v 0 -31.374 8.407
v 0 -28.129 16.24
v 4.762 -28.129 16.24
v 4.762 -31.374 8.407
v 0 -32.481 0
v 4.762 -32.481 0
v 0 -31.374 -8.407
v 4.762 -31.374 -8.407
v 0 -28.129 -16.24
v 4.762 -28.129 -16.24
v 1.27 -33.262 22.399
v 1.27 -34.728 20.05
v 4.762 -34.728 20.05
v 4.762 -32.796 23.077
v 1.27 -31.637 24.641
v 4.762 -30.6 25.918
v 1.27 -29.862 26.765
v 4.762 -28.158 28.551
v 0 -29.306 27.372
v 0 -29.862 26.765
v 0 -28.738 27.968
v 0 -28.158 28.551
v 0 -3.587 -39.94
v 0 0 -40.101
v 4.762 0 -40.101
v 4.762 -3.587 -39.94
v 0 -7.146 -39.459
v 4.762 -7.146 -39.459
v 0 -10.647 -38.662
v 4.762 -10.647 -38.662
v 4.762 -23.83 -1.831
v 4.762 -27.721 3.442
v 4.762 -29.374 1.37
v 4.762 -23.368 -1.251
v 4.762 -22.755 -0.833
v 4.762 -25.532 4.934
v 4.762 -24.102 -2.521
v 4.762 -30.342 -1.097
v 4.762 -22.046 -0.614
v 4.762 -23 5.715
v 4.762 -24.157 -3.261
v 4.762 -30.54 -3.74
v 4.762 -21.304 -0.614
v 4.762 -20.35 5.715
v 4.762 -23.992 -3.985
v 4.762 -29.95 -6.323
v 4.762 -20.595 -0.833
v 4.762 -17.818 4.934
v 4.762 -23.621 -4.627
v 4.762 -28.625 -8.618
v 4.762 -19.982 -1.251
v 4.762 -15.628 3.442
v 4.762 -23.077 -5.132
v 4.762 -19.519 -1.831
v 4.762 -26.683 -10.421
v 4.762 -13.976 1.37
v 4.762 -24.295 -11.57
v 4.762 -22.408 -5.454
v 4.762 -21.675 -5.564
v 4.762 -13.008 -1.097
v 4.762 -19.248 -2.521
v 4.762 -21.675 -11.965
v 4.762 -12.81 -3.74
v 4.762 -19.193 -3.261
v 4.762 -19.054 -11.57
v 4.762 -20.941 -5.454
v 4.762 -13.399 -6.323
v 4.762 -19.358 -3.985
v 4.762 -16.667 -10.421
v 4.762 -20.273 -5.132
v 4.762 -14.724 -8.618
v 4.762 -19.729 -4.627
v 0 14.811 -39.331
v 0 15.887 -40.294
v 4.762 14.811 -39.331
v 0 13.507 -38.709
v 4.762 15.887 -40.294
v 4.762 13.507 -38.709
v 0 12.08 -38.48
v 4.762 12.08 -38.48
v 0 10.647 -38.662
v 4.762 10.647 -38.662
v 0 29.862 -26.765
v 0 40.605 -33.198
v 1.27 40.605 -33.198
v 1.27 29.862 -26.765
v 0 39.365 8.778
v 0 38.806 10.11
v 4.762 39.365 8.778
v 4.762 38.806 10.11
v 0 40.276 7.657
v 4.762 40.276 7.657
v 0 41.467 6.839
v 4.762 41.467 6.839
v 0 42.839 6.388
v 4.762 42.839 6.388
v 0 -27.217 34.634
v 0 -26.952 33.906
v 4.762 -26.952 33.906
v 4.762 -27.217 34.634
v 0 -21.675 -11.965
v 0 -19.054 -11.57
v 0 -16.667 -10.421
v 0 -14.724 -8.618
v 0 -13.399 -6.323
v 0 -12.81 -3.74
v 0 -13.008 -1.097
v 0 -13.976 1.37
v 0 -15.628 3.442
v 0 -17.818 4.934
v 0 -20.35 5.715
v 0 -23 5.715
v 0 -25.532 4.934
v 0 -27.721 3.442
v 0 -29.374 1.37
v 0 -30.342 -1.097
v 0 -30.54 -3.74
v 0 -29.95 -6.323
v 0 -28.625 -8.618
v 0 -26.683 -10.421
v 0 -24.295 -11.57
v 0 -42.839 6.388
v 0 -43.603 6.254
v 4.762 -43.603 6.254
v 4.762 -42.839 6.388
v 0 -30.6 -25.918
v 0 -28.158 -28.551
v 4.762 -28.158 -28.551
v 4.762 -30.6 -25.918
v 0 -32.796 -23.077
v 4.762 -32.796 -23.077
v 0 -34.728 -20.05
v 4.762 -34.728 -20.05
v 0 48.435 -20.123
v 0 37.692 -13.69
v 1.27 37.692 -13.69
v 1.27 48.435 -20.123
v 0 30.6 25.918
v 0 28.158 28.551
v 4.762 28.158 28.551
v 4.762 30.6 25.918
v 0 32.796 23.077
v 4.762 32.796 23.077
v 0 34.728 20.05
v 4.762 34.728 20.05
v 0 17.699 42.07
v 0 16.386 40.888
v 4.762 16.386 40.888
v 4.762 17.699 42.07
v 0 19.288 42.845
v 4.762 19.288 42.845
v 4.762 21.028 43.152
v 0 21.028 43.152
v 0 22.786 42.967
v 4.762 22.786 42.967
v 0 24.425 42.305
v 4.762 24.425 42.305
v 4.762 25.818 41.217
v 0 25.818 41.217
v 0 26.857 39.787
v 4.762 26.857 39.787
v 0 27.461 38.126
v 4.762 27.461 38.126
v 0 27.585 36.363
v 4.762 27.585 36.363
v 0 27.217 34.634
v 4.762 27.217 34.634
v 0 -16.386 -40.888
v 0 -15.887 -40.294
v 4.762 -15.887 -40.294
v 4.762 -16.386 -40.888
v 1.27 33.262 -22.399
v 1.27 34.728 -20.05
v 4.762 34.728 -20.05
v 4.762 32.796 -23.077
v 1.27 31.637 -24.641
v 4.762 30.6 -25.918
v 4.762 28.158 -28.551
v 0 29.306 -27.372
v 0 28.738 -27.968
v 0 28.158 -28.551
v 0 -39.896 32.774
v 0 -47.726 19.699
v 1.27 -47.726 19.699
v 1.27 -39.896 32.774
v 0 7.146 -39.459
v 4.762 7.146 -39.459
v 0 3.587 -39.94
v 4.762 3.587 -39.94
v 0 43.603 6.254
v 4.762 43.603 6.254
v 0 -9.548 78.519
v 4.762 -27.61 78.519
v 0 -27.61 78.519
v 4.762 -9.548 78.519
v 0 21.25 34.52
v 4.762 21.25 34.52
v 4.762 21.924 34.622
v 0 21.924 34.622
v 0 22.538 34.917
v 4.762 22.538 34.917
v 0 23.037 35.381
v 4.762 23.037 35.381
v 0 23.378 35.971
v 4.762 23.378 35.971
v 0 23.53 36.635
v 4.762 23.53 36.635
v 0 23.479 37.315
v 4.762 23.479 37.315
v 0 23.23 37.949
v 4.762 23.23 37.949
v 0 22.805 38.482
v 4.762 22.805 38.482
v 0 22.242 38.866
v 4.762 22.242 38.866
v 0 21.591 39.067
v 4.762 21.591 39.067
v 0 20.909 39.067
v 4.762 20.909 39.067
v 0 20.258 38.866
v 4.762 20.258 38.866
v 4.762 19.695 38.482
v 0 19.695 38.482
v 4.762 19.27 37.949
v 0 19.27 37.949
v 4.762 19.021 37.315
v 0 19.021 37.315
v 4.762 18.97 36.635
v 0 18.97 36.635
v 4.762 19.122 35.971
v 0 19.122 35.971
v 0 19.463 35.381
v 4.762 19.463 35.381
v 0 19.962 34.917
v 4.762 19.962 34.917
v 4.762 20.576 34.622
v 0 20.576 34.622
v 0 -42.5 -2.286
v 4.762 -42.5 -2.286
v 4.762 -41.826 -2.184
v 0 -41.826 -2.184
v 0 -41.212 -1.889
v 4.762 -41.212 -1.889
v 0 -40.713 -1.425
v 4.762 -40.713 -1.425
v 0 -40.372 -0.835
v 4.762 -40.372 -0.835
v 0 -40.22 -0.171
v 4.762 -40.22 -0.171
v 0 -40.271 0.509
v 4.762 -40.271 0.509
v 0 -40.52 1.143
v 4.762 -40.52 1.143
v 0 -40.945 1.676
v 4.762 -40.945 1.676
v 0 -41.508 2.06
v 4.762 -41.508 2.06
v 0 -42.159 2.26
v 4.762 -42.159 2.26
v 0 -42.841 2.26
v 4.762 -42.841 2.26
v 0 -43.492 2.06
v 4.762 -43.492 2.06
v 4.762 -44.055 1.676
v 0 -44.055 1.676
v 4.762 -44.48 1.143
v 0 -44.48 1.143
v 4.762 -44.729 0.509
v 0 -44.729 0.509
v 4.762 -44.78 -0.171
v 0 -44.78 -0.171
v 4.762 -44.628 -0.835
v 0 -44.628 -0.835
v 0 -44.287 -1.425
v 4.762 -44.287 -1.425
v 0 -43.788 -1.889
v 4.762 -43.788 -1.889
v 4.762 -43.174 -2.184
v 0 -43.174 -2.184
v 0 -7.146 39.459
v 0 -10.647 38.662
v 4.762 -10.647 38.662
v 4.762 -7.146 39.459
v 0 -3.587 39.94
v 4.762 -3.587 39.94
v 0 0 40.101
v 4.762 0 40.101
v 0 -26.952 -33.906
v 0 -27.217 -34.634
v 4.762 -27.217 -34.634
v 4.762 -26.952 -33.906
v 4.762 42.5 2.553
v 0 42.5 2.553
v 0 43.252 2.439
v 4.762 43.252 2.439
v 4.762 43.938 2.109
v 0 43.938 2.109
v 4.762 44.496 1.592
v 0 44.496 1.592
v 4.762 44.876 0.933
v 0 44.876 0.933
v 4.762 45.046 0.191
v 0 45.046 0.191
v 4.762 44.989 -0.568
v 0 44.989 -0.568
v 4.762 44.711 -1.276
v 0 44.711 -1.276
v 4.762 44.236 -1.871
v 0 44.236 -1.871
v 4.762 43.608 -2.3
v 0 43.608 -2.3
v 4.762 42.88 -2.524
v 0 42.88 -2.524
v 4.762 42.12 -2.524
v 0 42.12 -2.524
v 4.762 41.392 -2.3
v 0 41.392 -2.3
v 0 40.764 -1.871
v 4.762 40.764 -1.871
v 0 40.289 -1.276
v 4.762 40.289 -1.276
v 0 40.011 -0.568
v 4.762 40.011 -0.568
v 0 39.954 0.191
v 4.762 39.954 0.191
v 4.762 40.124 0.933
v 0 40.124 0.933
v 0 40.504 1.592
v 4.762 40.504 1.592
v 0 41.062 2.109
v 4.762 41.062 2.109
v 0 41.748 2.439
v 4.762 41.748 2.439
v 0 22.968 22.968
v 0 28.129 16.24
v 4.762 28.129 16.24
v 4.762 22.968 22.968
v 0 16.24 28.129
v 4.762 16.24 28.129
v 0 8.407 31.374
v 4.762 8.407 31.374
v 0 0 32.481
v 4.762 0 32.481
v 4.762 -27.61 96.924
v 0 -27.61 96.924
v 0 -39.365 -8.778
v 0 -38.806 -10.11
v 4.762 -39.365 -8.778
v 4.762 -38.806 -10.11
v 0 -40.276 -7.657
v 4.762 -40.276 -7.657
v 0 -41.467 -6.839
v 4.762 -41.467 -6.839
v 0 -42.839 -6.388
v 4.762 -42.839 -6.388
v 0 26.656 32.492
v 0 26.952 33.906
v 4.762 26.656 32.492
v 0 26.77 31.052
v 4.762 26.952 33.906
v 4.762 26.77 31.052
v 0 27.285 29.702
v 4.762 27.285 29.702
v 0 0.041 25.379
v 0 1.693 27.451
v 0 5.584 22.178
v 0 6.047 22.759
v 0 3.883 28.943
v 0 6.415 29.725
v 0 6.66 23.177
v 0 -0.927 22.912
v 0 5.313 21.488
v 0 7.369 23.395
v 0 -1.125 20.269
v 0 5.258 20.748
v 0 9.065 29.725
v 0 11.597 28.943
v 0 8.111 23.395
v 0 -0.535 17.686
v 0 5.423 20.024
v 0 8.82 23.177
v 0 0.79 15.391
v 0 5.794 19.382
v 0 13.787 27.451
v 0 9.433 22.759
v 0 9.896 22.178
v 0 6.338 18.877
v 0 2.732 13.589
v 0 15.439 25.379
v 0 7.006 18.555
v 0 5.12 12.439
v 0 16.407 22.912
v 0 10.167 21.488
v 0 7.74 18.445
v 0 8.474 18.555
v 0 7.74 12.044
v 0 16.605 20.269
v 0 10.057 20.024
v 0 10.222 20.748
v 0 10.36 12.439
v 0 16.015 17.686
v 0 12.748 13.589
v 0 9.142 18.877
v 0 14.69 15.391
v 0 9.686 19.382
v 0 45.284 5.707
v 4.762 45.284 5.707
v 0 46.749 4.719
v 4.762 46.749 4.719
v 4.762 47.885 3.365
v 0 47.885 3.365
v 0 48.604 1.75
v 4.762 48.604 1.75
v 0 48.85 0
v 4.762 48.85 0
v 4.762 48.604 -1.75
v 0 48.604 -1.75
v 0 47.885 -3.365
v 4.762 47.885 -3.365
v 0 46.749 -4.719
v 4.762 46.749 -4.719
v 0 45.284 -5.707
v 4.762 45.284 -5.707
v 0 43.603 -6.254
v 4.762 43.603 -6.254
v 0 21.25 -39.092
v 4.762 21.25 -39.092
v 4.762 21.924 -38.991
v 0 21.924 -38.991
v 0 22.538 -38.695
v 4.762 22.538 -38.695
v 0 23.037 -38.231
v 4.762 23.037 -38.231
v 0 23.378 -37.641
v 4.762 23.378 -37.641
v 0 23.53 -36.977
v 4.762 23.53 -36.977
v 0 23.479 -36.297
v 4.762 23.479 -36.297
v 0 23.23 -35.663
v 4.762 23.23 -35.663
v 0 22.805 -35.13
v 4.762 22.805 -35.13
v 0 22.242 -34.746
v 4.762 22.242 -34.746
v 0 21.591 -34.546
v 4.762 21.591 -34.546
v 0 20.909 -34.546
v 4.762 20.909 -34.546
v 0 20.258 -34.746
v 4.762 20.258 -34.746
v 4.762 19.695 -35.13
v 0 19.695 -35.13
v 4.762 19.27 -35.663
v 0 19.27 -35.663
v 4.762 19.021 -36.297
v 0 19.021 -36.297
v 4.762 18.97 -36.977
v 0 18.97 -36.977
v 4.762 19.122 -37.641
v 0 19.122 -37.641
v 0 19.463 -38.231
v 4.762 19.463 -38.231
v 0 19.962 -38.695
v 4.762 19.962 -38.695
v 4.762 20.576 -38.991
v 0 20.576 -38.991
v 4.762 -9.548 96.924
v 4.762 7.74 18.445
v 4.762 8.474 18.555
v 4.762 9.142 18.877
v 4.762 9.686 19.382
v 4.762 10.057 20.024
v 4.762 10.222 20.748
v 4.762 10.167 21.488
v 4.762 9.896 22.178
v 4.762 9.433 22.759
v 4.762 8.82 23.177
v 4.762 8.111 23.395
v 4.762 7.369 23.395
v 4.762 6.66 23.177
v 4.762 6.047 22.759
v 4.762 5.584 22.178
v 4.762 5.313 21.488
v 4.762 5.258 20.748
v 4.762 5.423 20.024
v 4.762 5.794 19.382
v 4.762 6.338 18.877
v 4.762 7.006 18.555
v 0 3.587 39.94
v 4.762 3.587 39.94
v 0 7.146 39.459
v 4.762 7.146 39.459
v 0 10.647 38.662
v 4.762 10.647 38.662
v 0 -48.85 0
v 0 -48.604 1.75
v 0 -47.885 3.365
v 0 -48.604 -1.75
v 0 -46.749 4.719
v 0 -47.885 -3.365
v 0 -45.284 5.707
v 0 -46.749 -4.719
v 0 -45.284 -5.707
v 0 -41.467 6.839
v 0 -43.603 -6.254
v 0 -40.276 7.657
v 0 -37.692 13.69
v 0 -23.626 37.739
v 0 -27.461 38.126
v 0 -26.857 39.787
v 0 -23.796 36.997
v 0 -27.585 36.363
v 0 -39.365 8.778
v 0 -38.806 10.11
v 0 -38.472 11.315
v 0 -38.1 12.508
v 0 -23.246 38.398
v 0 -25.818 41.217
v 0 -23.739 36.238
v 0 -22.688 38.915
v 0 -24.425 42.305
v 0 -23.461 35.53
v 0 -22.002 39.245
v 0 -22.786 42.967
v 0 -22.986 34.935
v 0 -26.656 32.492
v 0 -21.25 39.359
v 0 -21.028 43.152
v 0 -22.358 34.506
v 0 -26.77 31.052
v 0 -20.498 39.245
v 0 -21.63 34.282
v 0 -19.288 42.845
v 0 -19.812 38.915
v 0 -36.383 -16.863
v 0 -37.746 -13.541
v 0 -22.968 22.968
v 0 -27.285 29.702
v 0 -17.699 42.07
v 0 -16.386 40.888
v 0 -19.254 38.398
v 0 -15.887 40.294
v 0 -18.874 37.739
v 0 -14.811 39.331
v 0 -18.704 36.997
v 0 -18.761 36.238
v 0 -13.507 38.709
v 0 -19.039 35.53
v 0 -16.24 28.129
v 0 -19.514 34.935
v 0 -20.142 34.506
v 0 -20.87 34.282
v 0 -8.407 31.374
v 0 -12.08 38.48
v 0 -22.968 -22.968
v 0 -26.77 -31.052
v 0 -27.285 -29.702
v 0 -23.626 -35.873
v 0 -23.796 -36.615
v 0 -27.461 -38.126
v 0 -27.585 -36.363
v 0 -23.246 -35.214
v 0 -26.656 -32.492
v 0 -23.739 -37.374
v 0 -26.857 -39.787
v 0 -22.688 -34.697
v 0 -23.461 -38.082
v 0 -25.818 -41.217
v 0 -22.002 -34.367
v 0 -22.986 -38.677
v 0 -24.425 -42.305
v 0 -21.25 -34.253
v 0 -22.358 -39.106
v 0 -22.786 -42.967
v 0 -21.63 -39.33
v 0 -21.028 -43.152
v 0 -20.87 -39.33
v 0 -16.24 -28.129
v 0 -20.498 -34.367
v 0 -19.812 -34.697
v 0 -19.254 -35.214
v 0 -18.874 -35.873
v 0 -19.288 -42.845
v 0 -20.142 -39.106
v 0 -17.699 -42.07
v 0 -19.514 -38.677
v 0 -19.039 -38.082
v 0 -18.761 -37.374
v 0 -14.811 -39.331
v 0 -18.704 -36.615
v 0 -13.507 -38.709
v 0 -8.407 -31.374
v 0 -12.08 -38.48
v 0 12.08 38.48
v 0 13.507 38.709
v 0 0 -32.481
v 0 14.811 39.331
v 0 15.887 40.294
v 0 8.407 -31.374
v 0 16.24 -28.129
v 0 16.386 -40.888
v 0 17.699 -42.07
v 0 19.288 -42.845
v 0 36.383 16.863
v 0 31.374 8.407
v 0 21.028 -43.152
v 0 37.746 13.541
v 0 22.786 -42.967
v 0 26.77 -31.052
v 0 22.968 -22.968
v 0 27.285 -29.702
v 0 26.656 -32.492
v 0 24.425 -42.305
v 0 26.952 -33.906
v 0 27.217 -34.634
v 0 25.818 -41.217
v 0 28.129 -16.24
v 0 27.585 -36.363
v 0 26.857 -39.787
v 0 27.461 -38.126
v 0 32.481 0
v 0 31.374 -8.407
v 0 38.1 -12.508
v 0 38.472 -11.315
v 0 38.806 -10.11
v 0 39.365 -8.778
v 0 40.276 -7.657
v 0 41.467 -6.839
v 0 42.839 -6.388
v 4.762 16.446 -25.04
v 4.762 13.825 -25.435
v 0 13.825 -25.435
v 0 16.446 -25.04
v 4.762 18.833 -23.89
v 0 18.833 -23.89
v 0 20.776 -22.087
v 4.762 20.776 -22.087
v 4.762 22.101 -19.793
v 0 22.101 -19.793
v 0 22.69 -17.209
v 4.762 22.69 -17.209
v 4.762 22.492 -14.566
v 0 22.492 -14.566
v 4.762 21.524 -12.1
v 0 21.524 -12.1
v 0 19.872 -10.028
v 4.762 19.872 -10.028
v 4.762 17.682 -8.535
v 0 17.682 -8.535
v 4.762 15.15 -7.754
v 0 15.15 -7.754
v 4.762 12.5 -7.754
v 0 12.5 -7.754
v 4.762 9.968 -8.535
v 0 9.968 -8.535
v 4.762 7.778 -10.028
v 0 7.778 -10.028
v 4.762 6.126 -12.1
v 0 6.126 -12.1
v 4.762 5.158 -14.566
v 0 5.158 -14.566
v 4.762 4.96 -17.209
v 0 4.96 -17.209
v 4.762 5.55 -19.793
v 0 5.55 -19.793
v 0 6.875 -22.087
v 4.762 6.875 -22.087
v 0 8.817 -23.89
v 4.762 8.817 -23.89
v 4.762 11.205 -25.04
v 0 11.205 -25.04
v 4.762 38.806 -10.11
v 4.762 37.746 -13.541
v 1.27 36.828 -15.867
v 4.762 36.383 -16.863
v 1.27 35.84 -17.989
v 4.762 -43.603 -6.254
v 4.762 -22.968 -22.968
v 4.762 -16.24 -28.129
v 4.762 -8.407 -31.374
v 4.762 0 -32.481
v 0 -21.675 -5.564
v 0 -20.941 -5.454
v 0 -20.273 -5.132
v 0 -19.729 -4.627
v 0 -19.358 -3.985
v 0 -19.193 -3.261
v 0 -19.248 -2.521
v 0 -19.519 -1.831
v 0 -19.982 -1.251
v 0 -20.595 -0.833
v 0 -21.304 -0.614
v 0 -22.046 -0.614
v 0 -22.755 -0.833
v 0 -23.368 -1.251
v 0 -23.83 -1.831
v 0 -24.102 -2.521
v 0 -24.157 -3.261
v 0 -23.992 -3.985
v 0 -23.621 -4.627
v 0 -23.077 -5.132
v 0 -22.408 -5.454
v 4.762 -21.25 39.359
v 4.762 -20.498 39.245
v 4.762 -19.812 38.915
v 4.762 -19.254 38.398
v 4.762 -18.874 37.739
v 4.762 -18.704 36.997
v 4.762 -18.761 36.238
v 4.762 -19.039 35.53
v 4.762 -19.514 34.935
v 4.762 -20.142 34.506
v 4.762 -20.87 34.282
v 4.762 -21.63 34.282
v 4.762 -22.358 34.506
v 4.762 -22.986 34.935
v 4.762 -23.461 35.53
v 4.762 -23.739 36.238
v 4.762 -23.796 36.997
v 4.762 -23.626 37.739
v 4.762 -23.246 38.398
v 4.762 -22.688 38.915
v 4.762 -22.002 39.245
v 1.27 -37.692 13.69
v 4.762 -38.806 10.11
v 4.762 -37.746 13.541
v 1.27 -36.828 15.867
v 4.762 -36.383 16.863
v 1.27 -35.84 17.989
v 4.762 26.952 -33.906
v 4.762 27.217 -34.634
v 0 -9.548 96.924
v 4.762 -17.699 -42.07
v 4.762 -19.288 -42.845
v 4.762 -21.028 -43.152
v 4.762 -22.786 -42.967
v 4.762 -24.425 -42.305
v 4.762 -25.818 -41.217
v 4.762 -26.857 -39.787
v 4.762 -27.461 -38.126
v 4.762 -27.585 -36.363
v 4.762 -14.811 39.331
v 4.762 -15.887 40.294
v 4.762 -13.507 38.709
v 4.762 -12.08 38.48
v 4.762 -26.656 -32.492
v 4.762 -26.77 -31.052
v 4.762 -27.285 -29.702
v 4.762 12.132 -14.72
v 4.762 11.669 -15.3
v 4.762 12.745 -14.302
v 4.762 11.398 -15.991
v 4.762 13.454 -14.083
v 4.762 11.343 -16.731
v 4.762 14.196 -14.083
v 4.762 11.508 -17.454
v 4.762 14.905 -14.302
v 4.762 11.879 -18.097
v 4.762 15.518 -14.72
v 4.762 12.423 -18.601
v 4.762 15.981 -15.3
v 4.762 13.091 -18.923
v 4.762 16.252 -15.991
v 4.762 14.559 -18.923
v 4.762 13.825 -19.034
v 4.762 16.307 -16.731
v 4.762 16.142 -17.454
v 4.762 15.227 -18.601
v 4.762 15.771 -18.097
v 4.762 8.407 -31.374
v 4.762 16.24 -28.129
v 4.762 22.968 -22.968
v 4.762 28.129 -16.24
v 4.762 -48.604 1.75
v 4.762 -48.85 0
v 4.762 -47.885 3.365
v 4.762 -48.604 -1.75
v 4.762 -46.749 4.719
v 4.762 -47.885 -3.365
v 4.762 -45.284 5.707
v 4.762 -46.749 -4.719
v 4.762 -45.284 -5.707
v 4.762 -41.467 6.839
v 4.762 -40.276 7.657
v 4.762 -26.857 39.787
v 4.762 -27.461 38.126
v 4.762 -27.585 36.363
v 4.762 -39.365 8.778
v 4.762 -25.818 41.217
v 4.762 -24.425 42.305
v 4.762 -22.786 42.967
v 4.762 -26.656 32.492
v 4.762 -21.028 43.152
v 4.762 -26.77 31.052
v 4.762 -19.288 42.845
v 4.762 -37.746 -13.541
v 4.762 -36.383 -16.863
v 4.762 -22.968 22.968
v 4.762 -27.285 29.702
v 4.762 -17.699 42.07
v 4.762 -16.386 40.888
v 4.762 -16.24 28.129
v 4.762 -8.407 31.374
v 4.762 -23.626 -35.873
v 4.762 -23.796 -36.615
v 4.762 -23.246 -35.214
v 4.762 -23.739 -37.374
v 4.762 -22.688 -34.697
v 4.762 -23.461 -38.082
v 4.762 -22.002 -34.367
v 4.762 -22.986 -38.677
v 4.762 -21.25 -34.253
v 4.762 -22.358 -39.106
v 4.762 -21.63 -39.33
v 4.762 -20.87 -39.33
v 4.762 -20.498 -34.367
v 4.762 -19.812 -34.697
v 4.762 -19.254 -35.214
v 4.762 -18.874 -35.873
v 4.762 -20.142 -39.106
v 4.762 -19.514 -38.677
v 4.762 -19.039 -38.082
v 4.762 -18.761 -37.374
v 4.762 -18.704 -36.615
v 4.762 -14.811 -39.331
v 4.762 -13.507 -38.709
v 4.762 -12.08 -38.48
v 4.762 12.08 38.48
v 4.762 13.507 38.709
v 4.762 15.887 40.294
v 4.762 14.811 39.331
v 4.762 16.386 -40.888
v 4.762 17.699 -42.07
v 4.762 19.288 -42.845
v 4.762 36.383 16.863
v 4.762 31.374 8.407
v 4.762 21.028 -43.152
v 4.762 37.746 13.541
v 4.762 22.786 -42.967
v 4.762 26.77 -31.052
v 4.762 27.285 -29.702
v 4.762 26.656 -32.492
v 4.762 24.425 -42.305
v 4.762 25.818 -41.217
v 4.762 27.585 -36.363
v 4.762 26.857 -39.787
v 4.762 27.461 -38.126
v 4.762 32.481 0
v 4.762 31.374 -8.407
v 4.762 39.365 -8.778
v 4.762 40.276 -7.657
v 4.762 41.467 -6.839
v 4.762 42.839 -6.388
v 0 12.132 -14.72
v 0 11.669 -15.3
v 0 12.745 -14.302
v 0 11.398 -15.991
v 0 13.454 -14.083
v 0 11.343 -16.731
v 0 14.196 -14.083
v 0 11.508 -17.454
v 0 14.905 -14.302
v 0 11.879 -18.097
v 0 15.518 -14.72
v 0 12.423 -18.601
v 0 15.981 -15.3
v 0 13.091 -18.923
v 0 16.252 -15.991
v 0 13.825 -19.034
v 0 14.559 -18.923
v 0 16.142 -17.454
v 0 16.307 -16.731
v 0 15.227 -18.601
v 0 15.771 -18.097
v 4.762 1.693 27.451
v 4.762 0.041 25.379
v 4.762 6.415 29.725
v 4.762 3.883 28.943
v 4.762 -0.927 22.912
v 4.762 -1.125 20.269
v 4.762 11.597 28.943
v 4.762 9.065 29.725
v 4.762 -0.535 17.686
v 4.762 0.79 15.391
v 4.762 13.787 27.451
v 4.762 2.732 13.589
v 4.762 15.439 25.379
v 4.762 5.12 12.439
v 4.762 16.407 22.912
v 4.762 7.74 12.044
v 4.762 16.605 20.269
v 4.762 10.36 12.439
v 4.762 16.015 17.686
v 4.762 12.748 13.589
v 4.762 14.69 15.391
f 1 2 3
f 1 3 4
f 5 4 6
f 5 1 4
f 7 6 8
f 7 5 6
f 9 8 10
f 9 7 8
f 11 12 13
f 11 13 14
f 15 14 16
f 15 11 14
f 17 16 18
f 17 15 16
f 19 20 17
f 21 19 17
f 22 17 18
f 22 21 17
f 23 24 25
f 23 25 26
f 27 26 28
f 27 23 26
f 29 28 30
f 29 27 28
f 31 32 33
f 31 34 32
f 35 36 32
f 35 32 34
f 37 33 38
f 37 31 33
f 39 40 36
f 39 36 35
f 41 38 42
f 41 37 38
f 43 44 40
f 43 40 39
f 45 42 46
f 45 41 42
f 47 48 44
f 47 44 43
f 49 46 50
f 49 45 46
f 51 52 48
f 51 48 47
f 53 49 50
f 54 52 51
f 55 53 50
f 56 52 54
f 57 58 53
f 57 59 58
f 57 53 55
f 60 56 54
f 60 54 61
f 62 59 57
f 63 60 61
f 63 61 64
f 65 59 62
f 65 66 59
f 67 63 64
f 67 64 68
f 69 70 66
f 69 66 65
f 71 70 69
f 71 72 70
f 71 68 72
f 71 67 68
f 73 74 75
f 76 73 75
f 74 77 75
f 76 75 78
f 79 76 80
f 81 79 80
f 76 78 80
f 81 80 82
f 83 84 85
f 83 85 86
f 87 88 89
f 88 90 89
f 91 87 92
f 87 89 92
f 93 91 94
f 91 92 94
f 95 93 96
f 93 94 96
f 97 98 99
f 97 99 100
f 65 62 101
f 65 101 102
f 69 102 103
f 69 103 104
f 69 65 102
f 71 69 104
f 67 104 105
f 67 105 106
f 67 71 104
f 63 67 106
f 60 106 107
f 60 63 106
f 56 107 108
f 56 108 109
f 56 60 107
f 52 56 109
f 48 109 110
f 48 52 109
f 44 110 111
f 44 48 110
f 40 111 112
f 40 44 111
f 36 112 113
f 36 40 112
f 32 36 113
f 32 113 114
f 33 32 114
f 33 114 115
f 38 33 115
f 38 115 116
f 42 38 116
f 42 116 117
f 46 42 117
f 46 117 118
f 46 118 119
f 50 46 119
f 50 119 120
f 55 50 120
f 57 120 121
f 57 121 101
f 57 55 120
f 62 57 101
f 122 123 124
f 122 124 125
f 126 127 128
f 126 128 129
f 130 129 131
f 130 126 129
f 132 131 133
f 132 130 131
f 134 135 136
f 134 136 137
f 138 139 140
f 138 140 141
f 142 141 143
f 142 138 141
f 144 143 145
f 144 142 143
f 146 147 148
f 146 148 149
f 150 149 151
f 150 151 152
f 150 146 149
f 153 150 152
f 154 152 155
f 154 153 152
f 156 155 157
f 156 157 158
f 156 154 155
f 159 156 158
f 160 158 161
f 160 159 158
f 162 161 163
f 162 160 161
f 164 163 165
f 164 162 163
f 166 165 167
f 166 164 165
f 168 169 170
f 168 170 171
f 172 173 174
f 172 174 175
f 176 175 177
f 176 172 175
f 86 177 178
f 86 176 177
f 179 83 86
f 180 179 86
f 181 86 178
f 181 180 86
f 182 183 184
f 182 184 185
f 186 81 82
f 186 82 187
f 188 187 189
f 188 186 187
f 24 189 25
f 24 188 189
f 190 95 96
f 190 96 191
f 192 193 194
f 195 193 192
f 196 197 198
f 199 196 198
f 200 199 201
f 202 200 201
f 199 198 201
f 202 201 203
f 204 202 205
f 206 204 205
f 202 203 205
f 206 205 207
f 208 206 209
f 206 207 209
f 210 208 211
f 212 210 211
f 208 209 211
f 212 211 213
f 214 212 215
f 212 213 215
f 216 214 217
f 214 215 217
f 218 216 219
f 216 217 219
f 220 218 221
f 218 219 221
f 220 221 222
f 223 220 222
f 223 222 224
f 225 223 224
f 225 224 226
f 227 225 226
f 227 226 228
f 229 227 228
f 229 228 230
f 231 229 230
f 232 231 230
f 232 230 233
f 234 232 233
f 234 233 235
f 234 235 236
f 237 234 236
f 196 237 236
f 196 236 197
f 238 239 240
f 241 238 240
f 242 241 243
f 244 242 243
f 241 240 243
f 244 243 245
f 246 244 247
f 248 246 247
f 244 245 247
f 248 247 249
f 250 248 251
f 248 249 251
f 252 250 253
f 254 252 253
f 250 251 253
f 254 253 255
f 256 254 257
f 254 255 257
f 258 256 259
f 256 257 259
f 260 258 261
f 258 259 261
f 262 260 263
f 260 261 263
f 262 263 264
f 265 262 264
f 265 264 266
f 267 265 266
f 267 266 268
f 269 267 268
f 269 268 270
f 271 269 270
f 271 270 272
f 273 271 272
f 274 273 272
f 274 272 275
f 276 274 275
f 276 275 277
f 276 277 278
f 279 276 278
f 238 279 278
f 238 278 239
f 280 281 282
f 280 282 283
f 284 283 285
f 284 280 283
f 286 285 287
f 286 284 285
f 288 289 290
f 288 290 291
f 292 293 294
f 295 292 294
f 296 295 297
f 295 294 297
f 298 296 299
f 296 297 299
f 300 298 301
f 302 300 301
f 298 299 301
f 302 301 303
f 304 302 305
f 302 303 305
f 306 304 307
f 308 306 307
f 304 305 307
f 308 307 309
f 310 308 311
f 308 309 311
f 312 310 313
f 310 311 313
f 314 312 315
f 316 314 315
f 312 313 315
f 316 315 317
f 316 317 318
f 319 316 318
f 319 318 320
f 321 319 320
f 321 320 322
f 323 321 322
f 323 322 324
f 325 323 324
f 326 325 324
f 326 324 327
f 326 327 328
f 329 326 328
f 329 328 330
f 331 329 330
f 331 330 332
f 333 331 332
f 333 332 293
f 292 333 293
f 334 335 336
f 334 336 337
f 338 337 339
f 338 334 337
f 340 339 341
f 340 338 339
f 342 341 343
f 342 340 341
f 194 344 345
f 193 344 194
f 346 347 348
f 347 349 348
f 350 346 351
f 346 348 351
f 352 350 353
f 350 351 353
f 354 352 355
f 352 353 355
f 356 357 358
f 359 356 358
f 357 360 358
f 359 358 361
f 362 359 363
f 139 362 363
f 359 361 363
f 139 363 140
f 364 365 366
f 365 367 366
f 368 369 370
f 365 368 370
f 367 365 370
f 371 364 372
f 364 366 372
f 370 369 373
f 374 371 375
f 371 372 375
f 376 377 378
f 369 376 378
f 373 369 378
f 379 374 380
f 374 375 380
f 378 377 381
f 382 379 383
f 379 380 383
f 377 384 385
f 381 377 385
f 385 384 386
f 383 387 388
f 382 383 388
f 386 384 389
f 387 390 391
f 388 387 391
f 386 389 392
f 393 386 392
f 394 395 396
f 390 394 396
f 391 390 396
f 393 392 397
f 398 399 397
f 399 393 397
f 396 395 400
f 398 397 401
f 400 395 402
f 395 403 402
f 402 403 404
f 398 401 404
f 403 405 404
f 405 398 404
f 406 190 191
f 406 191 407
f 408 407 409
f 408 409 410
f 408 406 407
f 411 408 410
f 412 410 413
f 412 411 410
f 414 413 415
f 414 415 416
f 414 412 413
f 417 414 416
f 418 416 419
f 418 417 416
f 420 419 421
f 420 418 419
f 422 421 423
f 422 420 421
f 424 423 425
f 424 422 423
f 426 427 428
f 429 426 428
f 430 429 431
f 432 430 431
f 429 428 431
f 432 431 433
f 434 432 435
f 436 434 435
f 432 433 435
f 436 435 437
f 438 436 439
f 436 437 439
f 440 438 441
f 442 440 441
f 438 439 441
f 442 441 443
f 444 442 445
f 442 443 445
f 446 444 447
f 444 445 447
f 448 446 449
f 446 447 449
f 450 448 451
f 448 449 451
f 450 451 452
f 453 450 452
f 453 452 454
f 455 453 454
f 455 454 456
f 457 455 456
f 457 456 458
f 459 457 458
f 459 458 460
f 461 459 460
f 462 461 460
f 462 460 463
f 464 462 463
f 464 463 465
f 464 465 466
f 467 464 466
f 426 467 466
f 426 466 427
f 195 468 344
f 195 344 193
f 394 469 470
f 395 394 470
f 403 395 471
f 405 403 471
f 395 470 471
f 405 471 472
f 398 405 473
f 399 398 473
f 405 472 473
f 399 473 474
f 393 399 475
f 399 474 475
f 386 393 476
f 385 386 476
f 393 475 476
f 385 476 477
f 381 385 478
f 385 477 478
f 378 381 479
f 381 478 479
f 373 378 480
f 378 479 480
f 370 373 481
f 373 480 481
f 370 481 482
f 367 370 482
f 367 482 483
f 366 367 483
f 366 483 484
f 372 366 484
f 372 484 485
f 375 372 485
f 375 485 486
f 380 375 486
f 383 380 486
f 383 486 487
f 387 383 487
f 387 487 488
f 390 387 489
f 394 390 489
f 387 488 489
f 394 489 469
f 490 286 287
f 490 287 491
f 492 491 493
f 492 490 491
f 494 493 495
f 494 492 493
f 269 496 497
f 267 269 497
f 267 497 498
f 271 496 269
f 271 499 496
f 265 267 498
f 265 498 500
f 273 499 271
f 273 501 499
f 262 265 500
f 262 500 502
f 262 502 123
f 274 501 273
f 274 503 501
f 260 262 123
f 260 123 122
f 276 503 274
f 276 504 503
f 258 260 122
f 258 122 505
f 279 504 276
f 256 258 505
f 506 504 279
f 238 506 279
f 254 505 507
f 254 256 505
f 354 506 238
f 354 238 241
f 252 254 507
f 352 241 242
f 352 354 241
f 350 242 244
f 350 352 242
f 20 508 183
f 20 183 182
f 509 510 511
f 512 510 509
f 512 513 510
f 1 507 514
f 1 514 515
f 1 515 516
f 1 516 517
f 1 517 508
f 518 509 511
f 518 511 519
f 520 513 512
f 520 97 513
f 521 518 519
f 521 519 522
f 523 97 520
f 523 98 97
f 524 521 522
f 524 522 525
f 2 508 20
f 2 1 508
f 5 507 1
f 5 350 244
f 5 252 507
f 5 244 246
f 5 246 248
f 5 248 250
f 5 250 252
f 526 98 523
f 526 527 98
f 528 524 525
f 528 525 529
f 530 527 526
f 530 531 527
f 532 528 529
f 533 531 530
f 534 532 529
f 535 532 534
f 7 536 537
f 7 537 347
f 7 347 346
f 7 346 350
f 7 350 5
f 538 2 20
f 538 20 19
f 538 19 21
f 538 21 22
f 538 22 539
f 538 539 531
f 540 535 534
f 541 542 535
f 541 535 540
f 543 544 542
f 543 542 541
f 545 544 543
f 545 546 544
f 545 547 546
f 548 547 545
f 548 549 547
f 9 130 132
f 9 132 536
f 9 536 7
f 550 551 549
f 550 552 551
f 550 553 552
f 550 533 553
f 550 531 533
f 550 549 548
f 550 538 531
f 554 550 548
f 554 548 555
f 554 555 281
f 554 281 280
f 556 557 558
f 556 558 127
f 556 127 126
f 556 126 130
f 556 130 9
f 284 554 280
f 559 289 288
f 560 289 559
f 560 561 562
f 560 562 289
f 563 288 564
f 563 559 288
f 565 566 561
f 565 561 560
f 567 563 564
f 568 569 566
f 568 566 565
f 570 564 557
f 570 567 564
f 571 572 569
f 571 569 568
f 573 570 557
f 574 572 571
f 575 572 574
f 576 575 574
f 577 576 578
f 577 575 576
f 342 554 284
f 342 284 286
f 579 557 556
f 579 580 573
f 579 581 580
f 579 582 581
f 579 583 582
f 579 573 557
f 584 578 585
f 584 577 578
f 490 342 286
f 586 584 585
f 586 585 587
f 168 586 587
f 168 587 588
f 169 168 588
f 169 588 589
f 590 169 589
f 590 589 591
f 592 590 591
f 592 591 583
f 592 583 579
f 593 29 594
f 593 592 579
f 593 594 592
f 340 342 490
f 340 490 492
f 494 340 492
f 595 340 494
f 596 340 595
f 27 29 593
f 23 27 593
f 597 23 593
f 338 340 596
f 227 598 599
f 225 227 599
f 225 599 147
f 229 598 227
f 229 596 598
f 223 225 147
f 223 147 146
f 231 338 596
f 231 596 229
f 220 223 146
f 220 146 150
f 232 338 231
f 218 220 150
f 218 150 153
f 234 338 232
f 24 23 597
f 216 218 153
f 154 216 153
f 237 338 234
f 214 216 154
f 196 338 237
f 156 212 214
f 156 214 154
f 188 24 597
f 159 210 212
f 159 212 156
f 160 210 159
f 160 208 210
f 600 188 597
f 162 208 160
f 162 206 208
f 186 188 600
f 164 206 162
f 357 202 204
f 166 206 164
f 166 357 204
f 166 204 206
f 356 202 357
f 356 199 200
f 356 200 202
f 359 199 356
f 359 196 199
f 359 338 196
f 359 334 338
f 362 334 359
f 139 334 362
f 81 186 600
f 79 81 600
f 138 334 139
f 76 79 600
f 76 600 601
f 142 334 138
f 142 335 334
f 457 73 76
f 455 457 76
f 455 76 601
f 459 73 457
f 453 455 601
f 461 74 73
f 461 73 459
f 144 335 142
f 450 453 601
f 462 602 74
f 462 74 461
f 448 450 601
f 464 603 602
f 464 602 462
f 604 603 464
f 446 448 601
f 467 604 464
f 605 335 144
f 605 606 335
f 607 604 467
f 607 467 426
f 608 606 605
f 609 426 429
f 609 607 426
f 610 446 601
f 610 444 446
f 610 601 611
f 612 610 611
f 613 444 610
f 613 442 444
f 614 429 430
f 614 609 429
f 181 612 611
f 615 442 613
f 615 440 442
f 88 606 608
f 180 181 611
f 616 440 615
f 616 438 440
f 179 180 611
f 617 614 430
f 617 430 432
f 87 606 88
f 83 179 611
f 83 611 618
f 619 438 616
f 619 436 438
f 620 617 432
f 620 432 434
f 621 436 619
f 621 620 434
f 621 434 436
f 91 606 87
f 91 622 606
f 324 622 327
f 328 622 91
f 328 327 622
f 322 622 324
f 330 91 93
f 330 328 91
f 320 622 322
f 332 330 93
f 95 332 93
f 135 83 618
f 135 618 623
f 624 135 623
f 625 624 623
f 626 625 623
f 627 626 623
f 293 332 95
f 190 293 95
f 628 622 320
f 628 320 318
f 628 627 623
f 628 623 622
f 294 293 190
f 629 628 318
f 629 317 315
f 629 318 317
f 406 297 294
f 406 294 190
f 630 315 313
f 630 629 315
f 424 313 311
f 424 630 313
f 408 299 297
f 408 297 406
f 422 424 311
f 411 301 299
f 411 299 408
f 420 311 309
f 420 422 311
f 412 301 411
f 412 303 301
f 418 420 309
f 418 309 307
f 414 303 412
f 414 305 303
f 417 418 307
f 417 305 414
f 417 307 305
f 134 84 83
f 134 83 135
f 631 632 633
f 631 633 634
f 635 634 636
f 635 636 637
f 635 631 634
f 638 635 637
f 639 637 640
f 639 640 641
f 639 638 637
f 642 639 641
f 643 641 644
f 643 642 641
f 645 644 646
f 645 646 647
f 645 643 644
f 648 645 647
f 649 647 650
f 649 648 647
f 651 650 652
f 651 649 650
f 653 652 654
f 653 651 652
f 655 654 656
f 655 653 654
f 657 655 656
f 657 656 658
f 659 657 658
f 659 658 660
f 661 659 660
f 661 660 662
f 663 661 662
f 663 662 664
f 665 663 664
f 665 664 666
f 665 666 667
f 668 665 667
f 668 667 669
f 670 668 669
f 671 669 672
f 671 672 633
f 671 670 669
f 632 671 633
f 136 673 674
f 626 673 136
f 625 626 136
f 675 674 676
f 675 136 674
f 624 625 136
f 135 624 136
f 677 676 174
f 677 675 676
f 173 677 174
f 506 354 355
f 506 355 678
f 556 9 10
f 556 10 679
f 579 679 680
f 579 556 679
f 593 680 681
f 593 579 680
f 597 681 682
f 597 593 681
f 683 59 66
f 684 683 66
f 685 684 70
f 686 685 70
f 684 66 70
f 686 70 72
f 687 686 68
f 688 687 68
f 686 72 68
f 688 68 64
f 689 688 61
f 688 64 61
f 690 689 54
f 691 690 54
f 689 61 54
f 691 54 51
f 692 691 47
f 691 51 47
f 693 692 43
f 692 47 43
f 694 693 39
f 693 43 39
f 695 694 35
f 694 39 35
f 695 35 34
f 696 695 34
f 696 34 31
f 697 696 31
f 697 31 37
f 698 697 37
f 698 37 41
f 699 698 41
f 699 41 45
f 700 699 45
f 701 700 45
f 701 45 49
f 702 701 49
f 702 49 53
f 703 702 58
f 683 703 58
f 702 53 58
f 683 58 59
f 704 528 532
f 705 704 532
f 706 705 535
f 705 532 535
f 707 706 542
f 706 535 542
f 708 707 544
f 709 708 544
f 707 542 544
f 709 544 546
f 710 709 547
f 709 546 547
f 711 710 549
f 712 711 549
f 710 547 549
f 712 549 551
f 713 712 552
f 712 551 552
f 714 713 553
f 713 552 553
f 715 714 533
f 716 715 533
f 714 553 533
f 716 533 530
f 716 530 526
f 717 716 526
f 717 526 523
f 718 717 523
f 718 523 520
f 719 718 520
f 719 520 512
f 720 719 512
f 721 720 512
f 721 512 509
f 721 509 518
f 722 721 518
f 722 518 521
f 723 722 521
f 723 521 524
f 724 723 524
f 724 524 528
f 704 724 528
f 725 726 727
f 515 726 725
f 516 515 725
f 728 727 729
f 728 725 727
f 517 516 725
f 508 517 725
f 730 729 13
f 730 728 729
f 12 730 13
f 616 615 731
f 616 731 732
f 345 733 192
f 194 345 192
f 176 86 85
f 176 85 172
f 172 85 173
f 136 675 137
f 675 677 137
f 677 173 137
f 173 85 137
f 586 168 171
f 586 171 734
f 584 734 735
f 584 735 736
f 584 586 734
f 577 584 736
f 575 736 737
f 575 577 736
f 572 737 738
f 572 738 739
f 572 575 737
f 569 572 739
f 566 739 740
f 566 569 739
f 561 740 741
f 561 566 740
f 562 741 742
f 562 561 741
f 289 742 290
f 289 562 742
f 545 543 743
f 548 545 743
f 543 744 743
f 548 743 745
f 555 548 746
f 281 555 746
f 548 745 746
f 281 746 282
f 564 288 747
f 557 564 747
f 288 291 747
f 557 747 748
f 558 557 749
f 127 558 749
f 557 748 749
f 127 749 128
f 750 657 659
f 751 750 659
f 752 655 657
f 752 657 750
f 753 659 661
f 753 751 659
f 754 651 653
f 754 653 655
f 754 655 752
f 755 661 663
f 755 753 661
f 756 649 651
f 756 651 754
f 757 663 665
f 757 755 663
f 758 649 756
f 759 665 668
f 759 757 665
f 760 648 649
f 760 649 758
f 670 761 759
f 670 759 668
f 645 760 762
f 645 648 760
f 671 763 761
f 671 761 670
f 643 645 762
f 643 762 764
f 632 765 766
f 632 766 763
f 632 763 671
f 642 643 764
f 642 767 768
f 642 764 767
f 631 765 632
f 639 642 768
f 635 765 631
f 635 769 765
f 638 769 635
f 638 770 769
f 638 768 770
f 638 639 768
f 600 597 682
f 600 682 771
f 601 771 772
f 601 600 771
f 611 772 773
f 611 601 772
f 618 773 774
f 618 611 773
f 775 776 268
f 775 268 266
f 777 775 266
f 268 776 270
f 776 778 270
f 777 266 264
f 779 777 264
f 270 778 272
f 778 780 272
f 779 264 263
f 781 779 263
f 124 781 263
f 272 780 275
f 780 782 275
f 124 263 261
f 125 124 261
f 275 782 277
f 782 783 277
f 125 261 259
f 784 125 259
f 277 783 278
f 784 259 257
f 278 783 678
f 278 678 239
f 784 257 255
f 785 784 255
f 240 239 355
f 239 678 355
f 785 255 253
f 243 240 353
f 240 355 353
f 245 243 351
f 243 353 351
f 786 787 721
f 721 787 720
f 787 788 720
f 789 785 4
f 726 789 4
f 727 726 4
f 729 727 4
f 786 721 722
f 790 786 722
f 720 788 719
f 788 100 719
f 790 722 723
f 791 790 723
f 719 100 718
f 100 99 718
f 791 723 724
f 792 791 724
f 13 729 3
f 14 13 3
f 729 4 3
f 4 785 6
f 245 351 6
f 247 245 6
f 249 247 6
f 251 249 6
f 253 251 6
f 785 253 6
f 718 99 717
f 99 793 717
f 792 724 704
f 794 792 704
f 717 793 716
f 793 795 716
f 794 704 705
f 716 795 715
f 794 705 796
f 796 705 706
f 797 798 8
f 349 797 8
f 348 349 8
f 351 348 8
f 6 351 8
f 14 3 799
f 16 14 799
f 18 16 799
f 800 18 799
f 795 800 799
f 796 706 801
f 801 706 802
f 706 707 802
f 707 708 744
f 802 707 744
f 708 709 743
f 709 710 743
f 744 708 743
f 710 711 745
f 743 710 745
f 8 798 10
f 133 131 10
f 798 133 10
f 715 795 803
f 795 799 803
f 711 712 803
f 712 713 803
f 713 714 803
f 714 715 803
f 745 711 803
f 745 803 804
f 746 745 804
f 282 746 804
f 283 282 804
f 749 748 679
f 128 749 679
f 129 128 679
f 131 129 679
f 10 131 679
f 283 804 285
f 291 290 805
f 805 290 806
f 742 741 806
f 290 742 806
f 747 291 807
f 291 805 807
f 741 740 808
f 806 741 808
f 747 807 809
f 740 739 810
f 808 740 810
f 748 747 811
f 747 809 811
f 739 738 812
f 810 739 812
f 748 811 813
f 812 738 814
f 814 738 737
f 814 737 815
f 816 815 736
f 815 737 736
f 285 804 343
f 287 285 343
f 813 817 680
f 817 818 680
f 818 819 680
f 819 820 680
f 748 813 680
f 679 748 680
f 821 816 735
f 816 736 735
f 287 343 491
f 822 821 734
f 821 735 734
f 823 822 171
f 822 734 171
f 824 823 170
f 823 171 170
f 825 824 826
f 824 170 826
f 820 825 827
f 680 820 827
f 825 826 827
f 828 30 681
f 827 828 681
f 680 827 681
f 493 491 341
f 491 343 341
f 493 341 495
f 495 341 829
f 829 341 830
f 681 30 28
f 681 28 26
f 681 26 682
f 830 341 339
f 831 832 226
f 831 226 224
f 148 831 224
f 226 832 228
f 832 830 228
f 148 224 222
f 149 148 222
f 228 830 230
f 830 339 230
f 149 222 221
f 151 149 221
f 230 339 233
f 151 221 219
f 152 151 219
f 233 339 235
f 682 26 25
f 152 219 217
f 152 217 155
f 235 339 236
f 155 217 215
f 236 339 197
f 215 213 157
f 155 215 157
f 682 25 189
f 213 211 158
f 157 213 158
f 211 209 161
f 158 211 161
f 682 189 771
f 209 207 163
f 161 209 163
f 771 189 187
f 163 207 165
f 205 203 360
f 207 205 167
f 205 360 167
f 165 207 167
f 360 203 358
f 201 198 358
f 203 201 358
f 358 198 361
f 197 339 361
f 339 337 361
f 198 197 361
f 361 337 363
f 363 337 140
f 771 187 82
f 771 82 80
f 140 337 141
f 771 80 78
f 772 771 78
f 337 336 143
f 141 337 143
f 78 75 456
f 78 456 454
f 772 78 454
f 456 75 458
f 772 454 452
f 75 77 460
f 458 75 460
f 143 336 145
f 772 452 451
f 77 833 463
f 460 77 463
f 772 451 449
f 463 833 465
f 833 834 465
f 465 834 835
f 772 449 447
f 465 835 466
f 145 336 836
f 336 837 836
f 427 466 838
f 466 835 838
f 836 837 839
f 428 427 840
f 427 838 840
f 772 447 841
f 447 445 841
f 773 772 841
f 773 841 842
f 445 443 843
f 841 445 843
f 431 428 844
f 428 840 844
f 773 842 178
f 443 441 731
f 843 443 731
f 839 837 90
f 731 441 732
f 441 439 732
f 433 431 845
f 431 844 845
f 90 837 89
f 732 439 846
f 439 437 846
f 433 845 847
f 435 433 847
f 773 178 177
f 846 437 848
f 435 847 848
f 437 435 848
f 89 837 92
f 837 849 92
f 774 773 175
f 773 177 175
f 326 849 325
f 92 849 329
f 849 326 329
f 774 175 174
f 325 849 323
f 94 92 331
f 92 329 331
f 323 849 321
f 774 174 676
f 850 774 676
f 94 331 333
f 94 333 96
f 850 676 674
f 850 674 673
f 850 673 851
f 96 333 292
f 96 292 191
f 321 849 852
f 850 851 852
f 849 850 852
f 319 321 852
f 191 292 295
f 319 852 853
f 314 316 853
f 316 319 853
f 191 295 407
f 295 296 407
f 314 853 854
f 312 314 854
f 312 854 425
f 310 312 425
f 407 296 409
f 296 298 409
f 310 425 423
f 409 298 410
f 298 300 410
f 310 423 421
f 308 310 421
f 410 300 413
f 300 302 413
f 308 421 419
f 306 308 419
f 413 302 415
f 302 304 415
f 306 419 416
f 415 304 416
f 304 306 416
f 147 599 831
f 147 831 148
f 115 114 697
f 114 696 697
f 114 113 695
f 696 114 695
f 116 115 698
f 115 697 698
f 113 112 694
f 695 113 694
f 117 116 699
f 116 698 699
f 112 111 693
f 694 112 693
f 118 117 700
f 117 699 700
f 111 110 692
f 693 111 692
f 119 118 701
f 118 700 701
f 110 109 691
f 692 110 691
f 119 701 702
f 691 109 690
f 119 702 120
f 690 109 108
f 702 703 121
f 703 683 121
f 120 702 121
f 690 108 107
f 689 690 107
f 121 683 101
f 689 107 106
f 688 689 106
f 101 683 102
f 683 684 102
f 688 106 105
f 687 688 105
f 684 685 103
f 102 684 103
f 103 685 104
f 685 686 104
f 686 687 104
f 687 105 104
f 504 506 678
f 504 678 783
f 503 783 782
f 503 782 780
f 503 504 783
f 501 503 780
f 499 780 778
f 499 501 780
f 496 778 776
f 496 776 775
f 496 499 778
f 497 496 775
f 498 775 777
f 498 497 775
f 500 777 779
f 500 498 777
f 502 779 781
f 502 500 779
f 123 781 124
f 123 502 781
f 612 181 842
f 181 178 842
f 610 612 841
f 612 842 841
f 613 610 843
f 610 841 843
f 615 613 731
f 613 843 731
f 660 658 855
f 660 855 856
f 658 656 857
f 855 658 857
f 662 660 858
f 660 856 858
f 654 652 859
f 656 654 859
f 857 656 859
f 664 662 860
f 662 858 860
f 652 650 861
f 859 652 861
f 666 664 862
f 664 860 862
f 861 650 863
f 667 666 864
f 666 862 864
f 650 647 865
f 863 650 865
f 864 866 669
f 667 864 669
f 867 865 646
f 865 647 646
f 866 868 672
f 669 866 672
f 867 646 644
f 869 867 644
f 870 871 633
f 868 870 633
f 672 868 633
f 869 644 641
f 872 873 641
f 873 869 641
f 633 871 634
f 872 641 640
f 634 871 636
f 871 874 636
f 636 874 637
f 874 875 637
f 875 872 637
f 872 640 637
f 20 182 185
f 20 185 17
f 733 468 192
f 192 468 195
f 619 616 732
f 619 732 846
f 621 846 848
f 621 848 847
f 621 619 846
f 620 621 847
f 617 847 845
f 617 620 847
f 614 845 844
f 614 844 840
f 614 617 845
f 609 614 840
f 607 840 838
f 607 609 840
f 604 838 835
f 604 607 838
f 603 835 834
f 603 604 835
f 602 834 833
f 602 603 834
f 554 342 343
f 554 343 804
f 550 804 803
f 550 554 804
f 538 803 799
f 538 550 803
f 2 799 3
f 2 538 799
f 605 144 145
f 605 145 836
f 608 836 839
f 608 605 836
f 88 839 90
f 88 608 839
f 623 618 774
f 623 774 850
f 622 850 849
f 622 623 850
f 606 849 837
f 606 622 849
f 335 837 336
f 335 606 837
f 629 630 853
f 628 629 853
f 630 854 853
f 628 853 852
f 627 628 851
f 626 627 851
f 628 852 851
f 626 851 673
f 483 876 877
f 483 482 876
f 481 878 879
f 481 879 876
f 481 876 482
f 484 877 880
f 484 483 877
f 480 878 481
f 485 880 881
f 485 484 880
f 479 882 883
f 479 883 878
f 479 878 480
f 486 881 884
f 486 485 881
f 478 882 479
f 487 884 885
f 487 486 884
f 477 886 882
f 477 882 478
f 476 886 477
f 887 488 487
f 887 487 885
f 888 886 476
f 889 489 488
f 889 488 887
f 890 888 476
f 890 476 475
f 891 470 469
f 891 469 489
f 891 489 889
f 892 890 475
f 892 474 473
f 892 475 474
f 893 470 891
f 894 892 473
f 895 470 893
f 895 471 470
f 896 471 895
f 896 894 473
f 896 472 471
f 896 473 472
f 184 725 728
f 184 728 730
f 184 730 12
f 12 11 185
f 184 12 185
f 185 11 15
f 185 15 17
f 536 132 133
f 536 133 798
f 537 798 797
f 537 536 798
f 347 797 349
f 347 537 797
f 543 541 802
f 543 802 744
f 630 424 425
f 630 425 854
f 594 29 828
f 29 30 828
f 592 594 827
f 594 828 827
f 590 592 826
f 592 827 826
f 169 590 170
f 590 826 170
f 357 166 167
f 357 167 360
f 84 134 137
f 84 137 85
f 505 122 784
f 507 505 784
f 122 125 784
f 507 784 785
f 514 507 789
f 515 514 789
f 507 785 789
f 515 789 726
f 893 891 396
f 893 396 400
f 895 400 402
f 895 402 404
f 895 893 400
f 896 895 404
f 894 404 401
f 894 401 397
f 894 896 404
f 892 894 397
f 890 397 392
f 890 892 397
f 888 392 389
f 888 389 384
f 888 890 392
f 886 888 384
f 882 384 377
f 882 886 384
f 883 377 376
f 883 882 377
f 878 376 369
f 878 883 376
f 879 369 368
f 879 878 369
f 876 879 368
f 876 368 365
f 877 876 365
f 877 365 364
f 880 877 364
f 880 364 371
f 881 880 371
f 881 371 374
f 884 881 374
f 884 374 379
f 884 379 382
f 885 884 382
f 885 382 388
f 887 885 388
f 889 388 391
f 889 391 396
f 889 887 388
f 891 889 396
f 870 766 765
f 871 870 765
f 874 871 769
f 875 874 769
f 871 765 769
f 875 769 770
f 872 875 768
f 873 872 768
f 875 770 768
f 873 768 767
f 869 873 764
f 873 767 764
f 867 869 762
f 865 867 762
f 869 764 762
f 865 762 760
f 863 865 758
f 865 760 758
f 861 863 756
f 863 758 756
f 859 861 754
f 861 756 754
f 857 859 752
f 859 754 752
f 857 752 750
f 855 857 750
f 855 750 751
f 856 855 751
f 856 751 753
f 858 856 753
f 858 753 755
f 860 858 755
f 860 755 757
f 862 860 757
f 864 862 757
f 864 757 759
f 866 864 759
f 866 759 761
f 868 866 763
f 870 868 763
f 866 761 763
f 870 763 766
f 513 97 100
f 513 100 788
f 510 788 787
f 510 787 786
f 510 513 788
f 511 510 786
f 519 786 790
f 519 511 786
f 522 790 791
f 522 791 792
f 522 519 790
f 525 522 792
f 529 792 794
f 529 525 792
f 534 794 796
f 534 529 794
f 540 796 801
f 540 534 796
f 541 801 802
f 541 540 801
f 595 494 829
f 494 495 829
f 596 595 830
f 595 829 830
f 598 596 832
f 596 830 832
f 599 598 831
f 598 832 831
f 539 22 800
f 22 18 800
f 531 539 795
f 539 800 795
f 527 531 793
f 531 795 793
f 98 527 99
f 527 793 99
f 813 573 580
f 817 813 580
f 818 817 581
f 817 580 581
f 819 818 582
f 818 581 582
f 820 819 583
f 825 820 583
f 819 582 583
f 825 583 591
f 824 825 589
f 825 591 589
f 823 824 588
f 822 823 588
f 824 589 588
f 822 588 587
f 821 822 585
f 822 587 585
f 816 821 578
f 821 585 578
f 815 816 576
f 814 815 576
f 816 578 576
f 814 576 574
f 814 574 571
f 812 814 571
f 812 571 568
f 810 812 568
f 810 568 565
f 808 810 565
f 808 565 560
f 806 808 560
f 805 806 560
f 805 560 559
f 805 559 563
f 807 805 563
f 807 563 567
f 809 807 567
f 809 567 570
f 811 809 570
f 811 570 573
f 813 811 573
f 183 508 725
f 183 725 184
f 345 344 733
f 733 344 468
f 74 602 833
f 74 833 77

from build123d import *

# Parameters (mm, degrees)
BOSS_EXTRUDE1_DEPTH    = 4.7625
FILLET1_R              = 5.08
CIRPATTERN2_COUNT      = 6
F_10_CLEARANCE_HOLE1_D = 5.1054
SKETCH4_R              = 2.286
CUT_EXTRUDE1_DEPTH     = 66.356339539
SKETCH5_R              = 8.89
SKETCH5_R_2            = 2.4892
BOSS_EXTRUDE2_DEPTH    = 4.7625
BOSS_EXTRUDE2_2_DEPTH  = 4.7625
BOSS_EXTRUDE2_3_DEPTH  = 4.7625
SKETCH5_W              = 18.404609089
SKETCH5_H              = 18.061812119
BOSS_EXTRUDE2_4_DEPTH  = 4.7625
BOSS_EXTRUDE3_DEPTH    = 1.27


with BuildPart() as part:
    # Sketch1 → Boss-Extrude1 (new body)
    with BuildSketch(Plane(origin=(0, 0, 0), x_dir=(0, 0, -1), z_dir=(1, 0, 0))):
        with BuildLine():
            Line((6.253529232, 43.602665928), (6.978878804, 39.489004083))
            ThreePointArc((6.978878804, 39.489004083), (13.722690374, 37.679888027), (20.050475012, 34.728441437))
            Line((20.050475012, 34.728441437), (16.240475012, 28.12932786))
            ThreePointArc((16.240475012, 28.12932786), (0, 32.480950024), (-16.240475012, 28.12932786))
            Line((-16.240475012, 28.12932786), (-20.050475012, 34.728441437))
            ThreePointArc((-20.050475012, 34.728441437), (-13.722690374, 37.679888027), (-6.978878804, 39.489004083))
            Line((-6.978878804, 39.489004083), (-6.253529232, 43.602665928))
            ThreePointArc((-6.253529232, 43.602665928), (0, 48.85), (6.253529232, 43.602665928))
        make_face()
    extrude(amount=BOSS_EXTRUDE1_DEPTH)

    # Fillet1
    fillet1_edges = [part.edges().sort_by_distance(p)[0] for p in [
        (2.38125, 39.489004083, -6.978878804),
        (2.38125, 39.489004083, 6.978878804),
    ]]
    fillet(fillet1_edges, radius=FILLET1_R)


with BuildPart() as cirpattern2_1:
    # CirPattern2: pattern copy
    add(part.part.rotate(Axis((0, 0, 0), (1, 0, 0)), 1 * 360 / CIRPATTERN2_COUNT))


with BuildPart() as cirpattern2_2:
    # CirPattern2: pattern copy
    add(part.part.rotate(Axis((0, 0, 0), (1, 0, 0)), 2 * 360 / CIRPATTERN2_COUNT))


with BuildPart() as cirpattern2_3:
    # CirPattern2: pattern copy
    add(part.part.rotate(Axis((0, 0, 0), (1, 0, 0)), 3 * 360 / CIRPATTERN2_COUNT))


with BuildPart() as cirpattern2_4:
    # CirPattern2: pattern copy
    add(part.part.rotate(Axis((0, 0, 0), (1, 0, 0)), 4 * 360 / CIRPATTERN2_COUNT))


with BuildPart() as cirpattern2_5:
    # CirPattern2: pattern copy
    add(part.part.rotate(Axis((0, 0, 0), (1, 0, 0)), 5 * 360 / CIRPATTERN2_COUNT))


with BuildPart() as part_1:
    add(part.part)

    # Combine1: union CirPattern2_1, CirPattern2_2, CirPattern2_3, CirPattern2_4, CirPattern2_5
    add(cirpattern2_1.part)
    add(cirpattern2_2.part)
    add(cirpattern2_3.part)
    add(cirpattern2_4.part)
    add(cirpattern2_5.part)

    # #10 Clearance Hole1 (through all)
    with Locations(Plane(origin=(4.7625, 0, 0), x_dir=(0, 0, -1), z_dir=(1, 0, 0))):
        with Locations((0, 42.5), (36.806079661, -21.25), (-36.806079661, -21.25)):
            Hole(F_10_CLEARANCE_HOLE1_D / 2)

    # Sketch4 → Cut-Extrude1 (cut, through all)
    with BuildSketch(Plane(origin=(4.7625, 0, 0), x_dir=(0, 0, -1), z_dir=(1, 0, 0))):
        with Locations((-36.806079661, 21.25)):
            Circle(SKETCH4_R)
        with Locations((36.806079661, 21.25)):
            Circle(SKETCH4_R)
        with Locations((0, -42.5)):
            Circle(SKETCH4_R)
    extrude(amount=-CUT_EXTRUDE1_DEPTH, mode=Mode.SUBTRACT)

    # Sketch6 → Boss-Extrude3 (add)
    with BuildSketch(Plane.ZY):
        Polygon((26.764713398, -29.861954215), (13.689895201, -37.691815587), (19.699082643, -47.726352546), (32.773900841, -39.896491175), align=None)
        Polygon((-26.764713398, 29.861954215), (-13.689895201, 37.691815587), (-20.123265238, 48.434680579), (-33.198083435, 40.604819208), align=None)
    extrude(amount=-BOSS_EXTRUDE3_DEPTH)


with BuildPart() as body_2:
    # Sketch5 → Boss-Extrude2 (new body)
    with BuildSketch(Plane(origin=(4.7625, 0, 0), x_dir=(0, 0, -1), z_dir=(1, 0, 0))):
        with Locations((-20.93383019, 7.740001125)):
            Circle(SKETCH5_R)
        with Locations((-20.93383019, 7.740001125)):
            Circle(SKETCH5_R_2, mode=Mode.SUBTRACT)
    extrude(amount=-BOSS_EXTRUDE2_DEPTH)


with BuildPart() as body_3:
    # Sketch5 → Boss-Extrude2 2 (new body)
    with BuildSketch(Plane(origin=(4.7625, 0, 0), x_dir=(0, 0, -1), z_dir=(1, 0, 0))):
        with Locations((3.07529833, -21.674761439)):
            Circle(SKETCH5_R)
        with Locations((3.07529833, -21.674761439)):
            Circle(SKETCH5_R_2, mode=Mode.SUBTRACT)
    extrude(amount=-BOSS_EXTRUDE2_2_DEPTH)


with BuildPart() as body_4:
    # Sketch5 → Boss-Extrude2 3 (new body)
    with BuildSketch(Plane(origin=(4.7625, 0, 0), x_dir=(0, 0, -1), z_dir=(1, 0, 0))):
        with Locations((16.544665697, 13.825135064)):
            Circle(SKETCH5_R)
        with Locations((16.544665697, 13.825135064)):
            Circle(SKETCH5_R_2, mode=Mode.SUBTRACT)
    extrude(amount=-BOSS_EXTRUDE2_3_DEPTH)


with BuildPart() as body_5:
    # Sketch5 → Boss-Extrude2 4 (new body)
    with BuildSketch(Plane(origin=(4.7625, 0, 0), x_dir=(0, 0, -1), z_dir=(1, 0, 0))):
        with Locations((-87.72135464, -18.578840948)):
            Rectangle(SKETCH5_W, SKETCH5_H)
    extrude(amount=-BOSS_EXTRUDE2_4_DEPTH)


solid = Compound([part_1.part, body_2.part, body_3.part, body_4.part, body_5.part])
